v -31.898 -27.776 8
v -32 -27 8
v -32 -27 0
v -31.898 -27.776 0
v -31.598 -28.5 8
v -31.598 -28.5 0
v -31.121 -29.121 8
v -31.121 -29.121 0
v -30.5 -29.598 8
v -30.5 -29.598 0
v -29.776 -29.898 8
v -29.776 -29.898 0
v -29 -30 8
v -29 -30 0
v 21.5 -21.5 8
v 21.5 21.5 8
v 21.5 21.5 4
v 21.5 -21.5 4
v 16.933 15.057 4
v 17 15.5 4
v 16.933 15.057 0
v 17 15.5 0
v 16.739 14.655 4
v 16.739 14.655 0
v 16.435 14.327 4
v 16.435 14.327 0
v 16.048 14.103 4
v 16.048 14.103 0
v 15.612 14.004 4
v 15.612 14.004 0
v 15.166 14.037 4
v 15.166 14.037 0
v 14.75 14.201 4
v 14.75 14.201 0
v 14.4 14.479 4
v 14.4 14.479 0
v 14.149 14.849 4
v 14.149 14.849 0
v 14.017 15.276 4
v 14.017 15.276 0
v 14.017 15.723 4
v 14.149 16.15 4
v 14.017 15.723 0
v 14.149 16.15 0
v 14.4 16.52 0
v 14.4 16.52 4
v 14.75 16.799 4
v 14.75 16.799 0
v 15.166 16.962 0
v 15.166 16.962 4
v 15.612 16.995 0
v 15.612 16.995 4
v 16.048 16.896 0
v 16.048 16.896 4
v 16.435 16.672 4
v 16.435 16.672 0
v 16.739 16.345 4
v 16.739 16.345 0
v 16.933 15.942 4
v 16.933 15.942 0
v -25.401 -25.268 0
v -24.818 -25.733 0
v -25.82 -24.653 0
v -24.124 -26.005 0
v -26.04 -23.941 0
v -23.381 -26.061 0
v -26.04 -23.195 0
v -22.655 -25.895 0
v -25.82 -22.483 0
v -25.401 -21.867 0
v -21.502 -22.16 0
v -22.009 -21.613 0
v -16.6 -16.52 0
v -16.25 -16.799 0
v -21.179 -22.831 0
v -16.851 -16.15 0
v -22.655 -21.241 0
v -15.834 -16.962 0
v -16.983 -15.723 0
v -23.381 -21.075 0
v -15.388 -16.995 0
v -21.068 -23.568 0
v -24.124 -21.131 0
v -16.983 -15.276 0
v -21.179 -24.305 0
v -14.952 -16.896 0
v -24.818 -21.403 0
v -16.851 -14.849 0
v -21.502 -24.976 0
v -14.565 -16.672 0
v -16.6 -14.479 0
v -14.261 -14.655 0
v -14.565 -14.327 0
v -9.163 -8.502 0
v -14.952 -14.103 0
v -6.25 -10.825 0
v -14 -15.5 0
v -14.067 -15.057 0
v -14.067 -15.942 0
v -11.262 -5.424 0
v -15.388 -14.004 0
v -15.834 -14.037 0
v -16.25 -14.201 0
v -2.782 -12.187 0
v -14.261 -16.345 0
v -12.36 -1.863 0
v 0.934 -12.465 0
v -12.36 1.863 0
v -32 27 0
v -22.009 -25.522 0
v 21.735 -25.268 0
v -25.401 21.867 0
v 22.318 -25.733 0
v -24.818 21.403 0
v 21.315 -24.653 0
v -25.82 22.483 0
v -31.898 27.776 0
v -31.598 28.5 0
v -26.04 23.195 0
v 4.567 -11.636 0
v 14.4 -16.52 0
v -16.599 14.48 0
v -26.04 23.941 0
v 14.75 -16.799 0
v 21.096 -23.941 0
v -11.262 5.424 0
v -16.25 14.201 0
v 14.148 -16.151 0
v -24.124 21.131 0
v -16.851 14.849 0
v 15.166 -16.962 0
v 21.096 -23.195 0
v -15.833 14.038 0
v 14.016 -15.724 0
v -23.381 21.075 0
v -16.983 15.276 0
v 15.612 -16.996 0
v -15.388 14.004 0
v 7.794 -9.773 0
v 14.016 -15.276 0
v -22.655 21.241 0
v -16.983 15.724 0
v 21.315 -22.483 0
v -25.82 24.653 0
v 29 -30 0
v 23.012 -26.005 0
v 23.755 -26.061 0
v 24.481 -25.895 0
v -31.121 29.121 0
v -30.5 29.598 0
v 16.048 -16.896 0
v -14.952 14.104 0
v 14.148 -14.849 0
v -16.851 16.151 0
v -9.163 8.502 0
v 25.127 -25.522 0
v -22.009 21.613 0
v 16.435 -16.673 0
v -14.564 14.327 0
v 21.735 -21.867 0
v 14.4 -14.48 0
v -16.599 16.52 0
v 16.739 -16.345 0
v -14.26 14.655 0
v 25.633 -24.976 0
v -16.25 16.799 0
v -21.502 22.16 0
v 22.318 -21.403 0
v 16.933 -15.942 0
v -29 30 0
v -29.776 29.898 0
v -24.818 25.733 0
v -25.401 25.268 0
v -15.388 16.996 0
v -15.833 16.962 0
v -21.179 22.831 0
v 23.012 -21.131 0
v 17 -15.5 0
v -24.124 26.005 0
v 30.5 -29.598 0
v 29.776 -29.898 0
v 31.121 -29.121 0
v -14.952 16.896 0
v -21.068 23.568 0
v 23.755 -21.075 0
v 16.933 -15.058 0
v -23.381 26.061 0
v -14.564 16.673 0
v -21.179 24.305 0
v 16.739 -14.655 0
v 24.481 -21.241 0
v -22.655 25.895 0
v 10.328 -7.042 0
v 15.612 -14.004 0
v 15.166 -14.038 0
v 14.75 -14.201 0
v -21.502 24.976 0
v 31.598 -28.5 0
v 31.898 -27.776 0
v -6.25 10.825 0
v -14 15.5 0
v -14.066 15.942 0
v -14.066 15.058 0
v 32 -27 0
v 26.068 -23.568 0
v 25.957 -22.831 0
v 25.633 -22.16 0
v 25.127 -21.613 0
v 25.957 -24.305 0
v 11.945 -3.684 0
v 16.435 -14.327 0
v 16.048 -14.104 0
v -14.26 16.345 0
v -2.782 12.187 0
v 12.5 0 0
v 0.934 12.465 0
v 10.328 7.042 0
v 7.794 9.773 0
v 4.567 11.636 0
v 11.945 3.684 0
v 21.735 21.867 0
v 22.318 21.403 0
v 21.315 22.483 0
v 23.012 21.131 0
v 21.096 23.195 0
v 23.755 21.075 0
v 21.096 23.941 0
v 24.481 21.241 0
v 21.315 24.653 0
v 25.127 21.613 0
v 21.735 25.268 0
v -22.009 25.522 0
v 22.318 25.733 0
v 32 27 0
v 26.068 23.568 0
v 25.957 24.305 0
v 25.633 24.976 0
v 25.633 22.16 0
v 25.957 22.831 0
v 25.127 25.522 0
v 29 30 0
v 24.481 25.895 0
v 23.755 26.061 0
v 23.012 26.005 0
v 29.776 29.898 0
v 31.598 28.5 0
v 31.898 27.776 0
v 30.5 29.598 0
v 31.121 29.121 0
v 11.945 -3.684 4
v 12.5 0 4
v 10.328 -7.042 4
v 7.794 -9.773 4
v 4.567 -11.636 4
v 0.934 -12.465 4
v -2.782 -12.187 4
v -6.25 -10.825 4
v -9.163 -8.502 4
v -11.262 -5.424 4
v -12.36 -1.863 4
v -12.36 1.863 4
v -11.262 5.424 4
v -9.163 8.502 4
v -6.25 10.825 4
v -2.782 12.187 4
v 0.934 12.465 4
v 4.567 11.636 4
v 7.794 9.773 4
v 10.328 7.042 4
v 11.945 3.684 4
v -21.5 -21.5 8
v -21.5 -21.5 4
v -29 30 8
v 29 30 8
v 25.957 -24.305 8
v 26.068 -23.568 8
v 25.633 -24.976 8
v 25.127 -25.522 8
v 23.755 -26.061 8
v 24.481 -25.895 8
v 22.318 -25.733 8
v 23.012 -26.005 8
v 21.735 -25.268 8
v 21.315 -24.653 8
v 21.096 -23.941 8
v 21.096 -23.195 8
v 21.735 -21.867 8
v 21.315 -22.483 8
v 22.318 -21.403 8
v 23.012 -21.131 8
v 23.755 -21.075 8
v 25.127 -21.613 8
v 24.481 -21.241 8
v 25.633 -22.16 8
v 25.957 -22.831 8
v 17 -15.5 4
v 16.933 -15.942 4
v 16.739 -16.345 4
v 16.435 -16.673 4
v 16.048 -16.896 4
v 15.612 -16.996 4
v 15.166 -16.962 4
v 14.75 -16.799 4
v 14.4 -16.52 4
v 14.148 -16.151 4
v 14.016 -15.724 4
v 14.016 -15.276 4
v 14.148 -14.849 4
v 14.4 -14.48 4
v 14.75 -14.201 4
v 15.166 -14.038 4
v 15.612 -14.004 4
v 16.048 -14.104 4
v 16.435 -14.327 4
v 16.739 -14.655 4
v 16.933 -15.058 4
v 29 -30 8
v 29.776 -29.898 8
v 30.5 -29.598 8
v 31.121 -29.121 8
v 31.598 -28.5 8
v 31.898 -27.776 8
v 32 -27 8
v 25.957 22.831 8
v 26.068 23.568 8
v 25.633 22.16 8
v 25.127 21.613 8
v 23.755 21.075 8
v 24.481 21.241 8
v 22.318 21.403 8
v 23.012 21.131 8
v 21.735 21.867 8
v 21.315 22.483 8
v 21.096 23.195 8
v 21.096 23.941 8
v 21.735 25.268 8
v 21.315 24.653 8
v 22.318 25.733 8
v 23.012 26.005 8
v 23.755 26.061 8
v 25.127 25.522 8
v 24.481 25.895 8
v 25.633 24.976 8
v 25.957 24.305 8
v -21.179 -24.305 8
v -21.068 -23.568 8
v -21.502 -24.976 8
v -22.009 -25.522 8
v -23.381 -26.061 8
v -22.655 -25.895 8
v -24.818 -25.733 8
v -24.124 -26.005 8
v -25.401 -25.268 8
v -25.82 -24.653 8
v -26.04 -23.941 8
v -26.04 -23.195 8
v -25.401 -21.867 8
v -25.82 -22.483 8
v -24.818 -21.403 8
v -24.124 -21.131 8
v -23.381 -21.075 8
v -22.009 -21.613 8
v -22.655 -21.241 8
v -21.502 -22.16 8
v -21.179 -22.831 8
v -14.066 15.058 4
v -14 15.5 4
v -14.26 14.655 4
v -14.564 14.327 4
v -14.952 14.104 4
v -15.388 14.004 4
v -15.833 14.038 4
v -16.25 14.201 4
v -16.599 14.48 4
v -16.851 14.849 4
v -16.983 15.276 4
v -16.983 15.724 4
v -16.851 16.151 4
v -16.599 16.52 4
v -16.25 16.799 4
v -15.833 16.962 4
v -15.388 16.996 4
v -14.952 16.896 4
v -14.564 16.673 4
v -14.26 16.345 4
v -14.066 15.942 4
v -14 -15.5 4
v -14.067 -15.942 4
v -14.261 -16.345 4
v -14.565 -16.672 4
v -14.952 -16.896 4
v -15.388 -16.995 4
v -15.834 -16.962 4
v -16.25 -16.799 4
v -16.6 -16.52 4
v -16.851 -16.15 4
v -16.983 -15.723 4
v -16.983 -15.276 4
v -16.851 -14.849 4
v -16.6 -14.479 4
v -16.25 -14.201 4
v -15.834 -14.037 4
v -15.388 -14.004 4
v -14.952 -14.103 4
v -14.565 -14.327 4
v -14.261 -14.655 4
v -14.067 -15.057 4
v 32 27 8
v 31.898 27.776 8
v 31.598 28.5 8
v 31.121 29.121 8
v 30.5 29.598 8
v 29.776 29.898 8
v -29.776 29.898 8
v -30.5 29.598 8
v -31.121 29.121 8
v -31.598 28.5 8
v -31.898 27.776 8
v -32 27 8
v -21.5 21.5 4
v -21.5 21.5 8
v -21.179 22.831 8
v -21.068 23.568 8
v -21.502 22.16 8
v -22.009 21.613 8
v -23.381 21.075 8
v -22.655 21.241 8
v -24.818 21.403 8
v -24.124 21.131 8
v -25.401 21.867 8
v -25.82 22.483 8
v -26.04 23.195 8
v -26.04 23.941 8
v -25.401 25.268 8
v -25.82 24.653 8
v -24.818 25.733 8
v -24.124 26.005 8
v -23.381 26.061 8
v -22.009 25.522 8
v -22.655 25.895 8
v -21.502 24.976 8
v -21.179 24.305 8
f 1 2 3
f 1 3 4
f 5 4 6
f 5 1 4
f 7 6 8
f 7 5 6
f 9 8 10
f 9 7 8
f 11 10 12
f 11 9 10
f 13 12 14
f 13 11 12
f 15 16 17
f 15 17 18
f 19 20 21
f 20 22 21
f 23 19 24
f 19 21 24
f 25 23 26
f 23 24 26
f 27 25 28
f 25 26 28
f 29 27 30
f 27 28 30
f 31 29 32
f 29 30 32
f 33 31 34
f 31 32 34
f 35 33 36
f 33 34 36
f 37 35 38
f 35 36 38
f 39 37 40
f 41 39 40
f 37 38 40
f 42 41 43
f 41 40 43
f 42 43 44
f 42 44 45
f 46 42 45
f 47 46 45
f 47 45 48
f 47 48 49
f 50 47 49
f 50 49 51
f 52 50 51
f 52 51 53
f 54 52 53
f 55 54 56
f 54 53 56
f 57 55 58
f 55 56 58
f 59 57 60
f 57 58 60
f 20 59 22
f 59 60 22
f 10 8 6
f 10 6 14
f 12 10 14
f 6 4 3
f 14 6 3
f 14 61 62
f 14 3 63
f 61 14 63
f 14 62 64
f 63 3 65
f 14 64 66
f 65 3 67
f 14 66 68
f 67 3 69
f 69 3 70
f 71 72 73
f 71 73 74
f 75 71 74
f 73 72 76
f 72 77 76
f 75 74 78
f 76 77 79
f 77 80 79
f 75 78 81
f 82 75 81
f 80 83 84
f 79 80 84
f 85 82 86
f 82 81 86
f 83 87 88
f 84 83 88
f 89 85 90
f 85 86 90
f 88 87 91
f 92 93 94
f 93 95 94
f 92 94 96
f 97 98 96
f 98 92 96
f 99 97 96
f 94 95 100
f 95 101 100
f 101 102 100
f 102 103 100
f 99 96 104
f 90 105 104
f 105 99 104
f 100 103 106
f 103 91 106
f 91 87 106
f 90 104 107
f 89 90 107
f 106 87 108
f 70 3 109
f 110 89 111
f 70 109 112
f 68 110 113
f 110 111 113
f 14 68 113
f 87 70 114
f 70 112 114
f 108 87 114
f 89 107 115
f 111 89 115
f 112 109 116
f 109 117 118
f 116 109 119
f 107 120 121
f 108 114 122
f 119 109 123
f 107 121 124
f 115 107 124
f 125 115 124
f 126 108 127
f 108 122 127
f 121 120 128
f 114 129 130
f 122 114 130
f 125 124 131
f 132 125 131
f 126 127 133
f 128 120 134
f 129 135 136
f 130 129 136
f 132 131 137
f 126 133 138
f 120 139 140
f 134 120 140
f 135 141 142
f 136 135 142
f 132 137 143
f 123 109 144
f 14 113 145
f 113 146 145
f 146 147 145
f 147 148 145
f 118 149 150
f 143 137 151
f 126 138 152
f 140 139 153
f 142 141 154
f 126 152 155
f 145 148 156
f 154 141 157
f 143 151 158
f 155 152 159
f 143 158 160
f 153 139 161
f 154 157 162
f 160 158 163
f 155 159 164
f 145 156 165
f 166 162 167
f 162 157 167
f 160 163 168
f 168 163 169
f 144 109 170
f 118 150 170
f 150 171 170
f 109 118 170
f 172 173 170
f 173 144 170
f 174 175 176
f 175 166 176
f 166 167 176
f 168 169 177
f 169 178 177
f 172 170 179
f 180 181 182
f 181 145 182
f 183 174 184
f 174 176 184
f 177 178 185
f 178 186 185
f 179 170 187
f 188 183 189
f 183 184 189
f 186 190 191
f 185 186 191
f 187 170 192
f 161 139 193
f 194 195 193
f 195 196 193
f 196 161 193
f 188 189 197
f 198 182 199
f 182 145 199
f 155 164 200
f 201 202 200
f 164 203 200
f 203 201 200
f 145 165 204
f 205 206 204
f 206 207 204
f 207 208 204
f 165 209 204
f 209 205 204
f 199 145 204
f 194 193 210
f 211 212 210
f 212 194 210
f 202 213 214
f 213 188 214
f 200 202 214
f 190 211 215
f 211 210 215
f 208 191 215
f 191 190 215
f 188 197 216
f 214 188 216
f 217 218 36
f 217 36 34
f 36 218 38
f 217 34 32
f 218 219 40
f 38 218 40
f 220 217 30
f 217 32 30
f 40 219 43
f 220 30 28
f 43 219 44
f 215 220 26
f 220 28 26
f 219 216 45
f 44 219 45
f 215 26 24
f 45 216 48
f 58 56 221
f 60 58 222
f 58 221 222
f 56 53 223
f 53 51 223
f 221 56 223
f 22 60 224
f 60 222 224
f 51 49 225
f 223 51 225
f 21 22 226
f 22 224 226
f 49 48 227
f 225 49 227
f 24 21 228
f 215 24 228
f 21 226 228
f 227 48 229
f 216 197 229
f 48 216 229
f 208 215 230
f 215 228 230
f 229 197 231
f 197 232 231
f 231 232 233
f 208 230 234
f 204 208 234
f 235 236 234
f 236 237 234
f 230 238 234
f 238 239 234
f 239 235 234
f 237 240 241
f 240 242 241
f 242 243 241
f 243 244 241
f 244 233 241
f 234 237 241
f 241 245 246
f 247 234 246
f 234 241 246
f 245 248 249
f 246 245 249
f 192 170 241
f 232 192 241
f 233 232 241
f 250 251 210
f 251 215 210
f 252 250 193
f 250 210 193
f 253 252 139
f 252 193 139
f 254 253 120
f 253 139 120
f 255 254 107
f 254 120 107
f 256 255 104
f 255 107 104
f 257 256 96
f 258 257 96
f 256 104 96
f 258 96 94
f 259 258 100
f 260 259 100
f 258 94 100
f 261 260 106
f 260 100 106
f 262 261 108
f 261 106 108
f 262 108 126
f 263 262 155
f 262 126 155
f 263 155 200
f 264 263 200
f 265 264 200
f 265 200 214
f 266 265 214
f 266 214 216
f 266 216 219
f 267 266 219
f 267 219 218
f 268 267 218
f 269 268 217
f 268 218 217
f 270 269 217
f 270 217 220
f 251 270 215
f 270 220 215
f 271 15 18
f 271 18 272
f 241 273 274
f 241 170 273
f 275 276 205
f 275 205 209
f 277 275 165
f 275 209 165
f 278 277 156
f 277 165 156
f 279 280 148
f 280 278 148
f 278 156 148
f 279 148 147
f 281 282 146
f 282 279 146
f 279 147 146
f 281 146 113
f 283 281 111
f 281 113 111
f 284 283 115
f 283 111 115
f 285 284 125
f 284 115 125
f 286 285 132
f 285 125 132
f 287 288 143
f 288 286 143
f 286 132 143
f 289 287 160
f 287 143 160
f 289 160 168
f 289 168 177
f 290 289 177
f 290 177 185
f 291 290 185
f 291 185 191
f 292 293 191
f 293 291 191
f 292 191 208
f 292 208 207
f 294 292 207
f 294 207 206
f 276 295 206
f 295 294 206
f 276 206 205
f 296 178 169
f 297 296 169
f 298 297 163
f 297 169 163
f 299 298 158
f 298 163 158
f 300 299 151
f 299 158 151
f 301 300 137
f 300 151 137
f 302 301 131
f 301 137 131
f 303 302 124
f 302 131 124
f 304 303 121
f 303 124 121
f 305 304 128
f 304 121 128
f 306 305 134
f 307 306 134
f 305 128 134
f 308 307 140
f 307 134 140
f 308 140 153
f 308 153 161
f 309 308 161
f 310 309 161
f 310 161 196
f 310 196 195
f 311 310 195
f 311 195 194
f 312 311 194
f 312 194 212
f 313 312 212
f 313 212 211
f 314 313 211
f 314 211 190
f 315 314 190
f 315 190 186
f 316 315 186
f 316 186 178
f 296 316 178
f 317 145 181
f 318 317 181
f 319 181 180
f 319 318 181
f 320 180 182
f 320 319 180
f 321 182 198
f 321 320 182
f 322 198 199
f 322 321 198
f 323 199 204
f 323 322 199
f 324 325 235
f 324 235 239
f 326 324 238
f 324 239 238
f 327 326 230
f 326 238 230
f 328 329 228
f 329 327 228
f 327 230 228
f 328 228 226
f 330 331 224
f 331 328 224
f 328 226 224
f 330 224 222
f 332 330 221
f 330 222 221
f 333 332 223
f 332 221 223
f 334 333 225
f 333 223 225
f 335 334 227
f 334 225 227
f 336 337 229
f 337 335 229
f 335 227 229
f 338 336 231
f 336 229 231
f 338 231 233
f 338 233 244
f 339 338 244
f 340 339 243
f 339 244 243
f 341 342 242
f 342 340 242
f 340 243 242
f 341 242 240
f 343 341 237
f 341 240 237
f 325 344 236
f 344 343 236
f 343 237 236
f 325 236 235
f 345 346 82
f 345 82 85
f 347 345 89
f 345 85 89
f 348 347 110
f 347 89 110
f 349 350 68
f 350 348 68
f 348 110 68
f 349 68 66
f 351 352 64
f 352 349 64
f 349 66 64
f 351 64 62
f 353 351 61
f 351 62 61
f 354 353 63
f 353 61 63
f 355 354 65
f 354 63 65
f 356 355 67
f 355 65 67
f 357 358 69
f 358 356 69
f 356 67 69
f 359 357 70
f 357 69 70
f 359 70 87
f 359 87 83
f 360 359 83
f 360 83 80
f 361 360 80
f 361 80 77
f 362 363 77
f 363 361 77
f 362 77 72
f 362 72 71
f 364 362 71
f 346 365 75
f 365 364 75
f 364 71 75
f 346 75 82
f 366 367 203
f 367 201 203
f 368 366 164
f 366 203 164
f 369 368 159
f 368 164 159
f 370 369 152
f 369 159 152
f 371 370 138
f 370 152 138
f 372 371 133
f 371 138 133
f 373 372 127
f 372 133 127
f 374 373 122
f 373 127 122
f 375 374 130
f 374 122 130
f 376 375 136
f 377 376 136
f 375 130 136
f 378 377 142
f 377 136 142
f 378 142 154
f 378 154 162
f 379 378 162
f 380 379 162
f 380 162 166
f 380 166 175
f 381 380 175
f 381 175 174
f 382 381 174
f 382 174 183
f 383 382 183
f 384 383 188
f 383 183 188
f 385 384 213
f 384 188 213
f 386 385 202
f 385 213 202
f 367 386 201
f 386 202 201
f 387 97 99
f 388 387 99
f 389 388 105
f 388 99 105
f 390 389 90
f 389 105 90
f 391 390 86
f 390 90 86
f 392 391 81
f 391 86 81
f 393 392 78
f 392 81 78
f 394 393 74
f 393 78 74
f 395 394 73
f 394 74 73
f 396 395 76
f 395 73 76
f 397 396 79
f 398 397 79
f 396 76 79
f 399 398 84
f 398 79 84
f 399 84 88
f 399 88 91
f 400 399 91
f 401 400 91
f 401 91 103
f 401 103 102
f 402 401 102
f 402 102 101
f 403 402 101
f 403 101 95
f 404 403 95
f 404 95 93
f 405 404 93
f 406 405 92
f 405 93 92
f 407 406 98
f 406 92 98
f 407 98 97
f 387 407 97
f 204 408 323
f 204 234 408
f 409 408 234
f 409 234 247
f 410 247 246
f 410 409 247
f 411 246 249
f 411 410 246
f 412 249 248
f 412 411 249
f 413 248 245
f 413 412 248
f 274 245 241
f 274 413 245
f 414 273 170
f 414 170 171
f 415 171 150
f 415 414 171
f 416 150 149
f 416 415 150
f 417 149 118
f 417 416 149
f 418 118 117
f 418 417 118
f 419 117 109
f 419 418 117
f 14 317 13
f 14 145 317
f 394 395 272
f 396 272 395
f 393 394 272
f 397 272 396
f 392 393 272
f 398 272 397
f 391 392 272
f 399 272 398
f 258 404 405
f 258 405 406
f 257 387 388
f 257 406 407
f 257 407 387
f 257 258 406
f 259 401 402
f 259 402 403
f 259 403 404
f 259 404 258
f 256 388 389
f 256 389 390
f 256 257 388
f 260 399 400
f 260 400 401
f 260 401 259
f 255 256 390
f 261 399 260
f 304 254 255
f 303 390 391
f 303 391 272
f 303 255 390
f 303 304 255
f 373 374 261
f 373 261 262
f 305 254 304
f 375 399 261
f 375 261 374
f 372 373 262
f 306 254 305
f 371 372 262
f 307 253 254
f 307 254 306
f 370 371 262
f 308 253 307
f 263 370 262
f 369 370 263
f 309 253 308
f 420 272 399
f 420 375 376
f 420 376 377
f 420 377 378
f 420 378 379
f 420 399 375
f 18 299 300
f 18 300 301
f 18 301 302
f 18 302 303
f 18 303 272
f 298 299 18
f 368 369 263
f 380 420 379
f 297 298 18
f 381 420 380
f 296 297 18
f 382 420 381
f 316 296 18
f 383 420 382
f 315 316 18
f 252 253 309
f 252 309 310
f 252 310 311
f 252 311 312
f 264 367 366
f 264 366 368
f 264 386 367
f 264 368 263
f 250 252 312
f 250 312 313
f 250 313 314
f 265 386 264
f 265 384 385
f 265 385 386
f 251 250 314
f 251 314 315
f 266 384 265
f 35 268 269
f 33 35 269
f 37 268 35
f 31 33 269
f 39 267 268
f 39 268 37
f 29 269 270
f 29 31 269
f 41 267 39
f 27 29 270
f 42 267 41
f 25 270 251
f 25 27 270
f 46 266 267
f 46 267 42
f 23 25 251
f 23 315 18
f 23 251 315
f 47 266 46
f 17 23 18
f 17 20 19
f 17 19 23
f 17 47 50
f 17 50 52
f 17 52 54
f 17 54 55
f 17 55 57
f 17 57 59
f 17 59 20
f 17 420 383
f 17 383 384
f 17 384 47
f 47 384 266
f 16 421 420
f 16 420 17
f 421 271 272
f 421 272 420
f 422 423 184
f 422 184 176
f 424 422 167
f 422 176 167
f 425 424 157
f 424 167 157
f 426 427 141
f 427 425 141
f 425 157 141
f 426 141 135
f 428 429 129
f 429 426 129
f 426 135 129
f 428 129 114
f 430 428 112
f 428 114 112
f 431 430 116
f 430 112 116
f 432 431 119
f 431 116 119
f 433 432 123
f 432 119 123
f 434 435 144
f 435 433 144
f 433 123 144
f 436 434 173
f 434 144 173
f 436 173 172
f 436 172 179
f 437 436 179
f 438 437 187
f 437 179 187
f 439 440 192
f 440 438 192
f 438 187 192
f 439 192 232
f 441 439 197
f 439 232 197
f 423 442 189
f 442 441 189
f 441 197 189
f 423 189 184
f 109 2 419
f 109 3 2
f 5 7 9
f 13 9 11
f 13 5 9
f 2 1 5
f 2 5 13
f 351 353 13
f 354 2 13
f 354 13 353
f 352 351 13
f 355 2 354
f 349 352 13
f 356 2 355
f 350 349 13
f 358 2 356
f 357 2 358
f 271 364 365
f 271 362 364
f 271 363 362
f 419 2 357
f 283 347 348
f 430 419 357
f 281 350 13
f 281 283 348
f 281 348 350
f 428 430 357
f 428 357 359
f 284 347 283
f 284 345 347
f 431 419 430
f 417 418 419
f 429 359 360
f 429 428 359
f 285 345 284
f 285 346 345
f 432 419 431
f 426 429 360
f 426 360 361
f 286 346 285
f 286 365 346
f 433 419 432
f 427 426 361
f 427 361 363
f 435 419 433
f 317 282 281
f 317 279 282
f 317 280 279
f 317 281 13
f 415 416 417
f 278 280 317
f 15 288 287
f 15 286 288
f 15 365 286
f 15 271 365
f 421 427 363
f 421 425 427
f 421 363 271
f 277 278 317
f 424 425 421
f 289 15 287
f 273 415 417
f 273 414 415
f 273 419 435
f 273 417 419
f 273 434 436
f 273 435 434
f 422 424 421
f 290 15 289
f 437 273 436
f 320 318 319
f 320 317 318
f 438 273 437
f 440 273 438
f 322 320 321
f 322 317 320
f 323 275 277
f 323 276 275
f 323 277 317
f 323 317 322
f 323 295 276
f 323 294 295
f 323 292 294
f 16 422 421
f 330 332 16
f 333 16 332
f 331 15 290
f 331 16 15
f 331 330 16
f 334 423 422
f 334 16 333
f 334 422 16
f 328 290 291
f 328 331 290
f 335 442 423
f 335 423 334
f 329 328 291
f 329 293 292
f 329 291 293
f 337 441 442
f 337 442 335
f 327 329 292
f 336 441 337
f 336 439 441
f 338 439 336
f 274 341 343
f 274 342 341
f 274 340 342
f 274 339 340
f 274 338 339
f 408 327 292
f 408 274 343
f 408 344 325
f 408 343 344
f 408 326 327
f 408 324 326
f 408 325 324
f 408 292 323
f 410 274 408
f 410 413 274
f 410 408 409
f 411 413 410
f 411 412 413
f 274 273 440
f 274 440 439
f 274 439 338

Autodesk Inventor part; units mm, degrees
ref_plane "YZ Plane" through (0, 0, 0) normal (1, 0, 0) x (0, 1, 0)
ref_plane "XZ Plane" through (0, 0, 0) normal (0, 1, 0) x (-1, 0, 0)
ref_plane "XY Plane" through (0, 0, 0) normal (0, 0, 1) x (1, 0, 0)
sketch "Sketch1" plane through (0, 0, 0) normal (0, 0, 1) x (1, 0, 0)
  circle A0 centre (0, 0) radius 12.5
  circle A1 centre (-15.4996, 15.5) radius 1.5
  circle A2 centre (-15.5, -15.4996) radius 1.5
  circle A3 centre (15.4996, -15.5) radius 1.5
  circle A4 centre (15.5, 15.4996) radius 1.5
  circle A5 centre (-23.5679, 23.5679) radius 2.5
  circle A6 centre (-23.5679, -23.5679) radius 2.5
  circle A7 centre (23.5679, -23.5679) radius 2.5
  circle A8 centre (23.5679, 23.5679) radius 2.5
  line L0 (0, 0) -> (-27.3582, 27.3582) construction
  line L1 (-32, 30) -> (32, 30)
  line L2 (32, 30) -> (32, -30)
  line L3 (32, -30) -> (-32, -30)
  line L4 (-32, -30) -> (-32, 30)
  dimension "d0" = 3
  dimension "d1" = 21.92
  dimension "d4" = 360
  dimension "d6" = 15.5
  dimension "d7" = 25
  dimension "d8" = 5
  dimension "d9" = 33.33
  dimension "d12" = 360
  dimension "d14" = 0
  dimension "d15" = 64
  dimension "d16" = 60
  dimension "d17" = 30
  dimension "d18" = 32
extrude "Extrusion1" add sketch "Sketch1" along normal blind 8
sketch "Sketch2" plane through (0, 0, 8) normal (0, 0, 1) x (1, 0, 0)
  line L0 (-21.5, 21.5) -> (21.5, 21.5)
  line L1 (21.5, 21.5) -> (21.5, -21.5)
  line L2 (21.5, -21.5) -> (-21.5, -21.5)
  line L3 (-21.5, -21.5) -> (-21.5, 21.5)
  point P0 (0, 0)
  dimension "d21" = 43
  dimension "d22" = 43
  dimension "d23" = 21.5
  dimension "d24" = 21.5
extrude "Extrusion2" cut sketch "Sketch2" against normal blind 4
fillet "Fillet1" radius 3 4 edges at (32, 30, 4) (-32, 30, 4) (-32, -30, 4) (32, -30, 4)
equation "\"d17\" = 0.5 * d16"
equation "\"d18\" = 0.5 * d15"
equation "\"d21\" = d22"
equation "\"d23\" = 0.5 * d22"
equation "\"d24\" = 0.5 * d21"
properties part number "motor support"
